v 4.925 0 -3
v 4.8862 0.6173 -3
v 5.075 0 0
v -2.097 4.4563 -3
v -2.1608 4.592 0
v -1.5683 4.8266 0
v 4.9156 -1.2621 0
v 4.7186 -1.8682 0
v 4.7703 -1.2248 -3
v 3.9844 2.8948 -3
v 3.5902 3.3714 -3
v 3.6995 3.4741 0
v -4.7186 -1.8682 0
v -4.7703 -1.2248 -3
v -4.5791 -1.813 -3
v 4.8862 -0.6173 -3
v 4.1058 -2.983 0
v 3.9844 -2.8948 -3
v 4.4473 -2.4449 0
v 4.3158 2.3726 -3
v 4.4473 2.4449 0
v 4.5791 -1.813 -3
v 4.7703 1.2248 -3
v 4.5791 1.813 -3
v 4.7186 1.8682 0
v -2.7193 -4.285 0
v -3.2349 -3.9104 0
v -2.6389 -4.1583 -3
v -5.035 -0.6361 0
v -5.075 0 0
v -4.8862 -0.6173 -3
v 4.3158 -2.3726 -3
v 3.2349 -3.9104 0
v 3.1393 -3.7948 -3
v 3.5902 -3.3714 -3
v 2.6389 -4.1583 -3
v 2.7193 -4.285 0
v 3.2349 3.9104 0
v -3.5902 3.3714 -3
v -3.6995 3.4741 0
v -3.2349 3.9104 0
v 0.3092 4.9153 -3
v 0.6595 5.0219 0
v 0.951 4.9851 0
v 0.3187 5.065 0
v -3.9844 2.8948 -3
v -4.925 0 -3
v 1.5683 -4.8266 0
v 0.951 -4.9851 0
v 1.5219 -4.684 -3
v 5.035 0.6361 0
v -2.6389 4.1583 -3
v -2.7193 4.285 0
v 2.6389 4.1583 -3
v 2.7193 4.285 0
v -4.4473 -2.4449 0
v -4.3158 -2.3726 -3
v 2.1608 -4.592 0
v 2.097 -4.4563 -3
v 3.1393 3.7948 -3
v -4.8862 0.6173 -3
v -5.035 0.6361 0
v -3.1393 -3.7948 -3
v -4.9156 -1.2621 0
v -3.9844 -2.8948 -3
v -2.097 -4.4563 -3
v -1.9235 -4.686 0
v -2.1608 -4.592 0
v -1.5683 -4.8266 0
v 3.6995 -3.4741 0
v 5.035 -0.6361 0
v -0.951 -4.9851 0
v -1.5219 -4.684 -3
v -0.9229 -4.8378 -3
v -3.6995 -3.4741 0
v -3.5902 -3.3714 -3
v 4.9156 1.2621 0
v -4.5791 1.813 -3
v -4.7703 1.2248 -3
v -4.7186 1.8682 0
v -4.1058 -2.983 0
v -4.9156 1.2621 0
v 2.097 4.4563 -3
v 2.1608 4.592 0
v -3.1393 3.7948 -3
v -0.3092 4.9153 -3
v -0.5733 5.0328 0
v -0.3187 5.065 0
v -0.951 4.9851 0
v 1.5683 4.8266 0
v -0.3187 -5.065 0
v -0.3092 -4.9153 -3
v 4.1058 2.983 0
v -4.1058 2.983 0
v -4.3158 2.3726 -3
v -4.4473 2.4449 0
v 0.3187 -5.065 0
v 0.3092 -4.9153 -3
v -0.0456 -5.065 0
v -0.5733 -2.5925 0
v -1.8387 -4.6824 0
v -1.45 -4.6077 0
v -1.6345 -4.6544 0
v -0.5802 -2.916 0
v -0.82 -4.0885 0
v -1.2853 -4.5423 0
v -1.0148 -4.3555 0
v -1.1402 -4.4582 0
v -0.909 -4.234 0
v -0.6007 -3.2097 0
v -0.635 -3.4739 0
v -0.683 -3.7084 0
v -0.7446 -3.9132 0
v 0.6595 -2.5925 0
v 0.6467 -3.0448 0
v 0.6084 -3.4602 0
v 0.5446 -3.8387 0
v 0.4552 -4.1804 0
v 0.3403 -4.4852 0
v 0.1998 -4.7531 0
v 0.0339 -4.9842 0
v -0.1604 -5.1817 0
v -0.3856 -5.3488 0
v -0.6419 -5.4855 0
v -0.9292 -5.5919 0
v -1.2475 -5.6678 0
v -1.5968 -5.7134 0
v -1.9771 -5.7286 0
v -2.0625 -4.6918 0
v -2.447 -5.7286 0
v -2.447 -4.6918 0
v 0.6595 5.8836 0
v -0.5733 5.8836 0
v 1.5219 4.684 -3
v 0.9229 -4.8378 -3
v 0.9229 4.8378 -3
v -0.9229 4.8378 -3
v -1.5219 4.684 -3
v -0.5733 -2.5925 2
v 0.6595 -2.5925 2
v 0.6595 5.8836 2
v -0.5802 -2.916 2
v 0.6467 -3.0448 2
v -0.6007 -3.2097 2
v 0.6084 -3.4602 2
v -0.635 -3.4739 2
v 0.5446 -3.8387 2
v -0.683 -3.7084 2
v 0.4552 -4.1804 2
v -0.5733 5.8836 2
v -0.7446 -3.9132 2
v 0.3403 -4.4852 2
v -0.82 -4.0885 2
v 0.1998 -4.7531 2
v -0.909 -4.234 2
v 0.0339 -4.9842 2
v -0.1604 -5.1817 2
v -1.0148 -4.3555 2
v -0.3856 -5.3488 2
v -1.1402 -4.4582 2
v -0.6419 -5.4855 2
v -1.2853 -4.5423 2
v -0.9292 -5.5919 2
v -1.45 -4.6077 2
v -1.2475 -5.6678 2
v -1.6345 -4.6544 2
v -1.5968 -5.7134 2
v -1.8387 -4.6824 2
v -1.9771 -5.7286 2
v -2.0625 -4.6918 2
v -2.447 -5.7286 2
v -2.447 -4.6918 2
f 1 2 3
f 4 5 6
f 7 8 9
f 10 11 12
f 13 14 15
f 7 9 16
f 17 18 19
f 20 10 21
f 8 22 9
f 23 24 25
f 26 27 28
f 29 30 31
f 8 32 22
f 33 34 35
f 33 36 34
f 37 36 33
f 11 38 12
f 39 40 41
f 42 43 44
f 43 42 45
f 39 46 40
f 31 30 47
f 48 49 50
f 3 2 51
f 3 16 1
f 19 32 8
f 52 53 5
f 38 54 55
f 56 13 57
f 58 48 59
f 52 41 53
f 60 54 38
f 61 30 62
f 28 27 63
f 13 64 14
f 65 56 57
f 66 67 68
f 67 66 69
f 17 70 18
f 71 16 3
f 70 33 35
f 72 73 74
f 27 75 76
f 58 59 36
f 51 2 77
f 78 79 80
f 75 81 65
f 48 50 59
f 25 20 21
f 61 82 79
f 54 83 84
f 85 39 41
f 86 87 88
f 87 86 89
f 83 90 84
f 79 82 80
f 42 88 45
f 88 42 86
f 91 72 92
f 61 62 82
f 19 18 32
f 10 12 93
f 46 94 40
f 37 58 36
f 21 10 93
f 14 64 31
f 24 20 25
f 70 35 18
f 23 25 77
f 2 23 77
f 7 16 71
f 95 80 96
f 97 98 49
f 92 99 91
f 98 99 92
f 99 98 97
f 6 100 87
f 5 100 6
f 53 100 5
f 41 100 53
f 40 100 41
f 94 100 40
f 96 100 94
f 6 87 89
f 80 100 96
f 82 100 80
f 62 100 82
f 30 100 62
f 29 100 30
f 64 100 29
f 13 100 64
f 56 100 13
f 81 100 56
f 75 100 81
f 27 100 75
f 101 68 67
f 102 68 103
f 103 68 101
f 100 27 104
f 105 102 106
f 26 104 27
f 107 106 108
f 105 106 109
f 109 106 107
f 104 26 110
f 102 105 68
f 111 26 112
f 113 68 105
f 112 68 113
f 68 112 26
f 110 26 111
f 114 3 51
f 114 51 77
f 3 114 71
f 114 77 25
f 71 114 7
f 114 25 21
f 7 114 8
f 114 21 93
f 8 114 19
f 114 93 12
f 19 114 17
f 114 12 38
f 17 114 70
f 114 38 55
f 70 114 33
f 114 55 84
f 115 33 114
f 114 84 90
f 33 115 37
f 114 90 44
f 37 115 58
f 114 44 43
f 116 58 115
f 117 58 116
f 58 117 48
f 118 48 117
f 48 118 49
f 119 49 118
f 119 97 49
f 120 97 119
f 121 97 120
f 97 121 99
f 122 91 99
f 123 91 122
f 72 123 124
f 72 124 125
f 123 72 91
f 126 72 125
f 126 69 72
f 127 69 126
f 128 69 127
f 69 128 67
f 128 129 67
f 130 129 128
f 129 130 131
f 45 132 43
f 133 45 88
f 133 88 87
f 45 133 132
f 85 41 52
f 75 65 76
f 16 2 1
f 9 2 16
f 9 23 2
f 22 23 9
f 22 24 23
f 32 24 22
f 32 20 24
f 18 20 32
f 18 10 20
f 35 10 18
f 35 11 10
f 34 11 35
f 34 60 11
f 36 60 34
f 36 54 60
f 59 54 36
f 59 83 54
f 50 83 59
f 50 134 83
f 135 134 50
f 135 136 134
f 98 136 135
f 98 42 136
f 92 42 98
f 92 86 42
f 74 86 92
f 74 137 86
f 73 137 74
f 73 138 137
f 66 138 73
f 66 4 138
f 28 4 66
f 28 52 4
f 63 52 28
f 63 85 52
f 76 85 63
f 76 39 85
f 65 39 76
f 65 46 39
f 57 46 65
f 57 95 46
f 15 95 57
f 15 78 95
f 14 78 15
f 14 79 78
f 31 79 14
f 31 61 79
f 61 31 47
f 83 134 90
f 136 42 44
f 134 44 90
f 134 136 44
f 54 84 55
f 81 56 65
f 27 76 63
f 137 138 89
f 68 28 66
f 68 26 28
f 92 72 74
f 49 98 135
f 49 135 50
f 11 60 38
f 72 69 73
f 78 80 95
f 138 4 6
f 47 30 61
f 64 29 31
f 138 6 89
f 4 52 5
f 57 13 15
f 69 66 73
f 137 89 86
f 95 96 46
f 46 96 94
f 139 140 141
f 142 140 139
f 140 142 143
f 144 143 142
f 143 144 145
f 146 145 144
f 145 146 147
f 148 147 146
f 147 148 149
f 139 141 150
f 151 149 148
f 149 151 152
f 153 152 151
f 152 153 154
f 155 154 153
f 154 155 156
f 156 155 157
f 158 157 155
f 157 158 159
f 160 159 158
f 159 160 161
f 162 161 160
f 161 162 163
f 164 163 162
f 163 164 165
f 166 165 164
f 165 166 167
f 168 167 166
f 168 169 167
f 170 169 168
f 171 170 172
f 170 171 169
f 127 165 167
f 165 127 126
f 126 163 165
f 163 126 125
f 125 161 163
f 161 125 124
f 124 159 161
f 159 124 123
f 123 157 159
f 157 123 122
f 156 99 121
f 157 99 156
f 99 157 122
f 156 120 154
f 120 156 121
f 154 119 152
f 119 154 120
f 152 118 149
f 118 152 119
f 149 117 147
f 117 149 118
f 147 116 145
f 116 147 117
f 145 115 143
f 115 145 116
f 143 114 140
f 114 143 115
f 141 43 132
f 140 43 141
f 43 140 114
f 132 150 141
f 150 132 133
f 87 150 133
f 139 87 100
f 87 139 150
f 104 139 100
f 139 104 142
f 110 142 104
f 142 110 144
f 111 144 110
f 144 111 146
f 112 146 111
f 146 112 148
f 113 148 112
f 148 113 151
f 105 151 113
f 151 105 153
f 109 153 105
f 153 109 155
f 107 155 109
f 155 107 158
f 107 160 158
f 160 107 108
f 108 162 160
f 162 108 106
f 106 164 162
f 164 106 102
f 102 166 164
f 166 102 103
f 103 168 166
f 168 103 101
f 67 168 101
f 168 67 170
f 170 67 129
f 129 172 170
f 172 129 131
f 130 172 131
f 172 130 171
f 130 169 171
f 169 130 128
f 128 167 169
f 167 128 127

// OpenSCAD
$fn = 50;

difference() {
	union() {
		translate(v = [0, 0, -3.0]) {
			cylinder(h = 3, r1 = 4.925, r2 = 5.075);
		}
		linear_extrude(height = 2) {
			text(font = "Wingdings", halign = "center", size = 9, text = "J", valign = "center");
		}
	}
	union();
}
